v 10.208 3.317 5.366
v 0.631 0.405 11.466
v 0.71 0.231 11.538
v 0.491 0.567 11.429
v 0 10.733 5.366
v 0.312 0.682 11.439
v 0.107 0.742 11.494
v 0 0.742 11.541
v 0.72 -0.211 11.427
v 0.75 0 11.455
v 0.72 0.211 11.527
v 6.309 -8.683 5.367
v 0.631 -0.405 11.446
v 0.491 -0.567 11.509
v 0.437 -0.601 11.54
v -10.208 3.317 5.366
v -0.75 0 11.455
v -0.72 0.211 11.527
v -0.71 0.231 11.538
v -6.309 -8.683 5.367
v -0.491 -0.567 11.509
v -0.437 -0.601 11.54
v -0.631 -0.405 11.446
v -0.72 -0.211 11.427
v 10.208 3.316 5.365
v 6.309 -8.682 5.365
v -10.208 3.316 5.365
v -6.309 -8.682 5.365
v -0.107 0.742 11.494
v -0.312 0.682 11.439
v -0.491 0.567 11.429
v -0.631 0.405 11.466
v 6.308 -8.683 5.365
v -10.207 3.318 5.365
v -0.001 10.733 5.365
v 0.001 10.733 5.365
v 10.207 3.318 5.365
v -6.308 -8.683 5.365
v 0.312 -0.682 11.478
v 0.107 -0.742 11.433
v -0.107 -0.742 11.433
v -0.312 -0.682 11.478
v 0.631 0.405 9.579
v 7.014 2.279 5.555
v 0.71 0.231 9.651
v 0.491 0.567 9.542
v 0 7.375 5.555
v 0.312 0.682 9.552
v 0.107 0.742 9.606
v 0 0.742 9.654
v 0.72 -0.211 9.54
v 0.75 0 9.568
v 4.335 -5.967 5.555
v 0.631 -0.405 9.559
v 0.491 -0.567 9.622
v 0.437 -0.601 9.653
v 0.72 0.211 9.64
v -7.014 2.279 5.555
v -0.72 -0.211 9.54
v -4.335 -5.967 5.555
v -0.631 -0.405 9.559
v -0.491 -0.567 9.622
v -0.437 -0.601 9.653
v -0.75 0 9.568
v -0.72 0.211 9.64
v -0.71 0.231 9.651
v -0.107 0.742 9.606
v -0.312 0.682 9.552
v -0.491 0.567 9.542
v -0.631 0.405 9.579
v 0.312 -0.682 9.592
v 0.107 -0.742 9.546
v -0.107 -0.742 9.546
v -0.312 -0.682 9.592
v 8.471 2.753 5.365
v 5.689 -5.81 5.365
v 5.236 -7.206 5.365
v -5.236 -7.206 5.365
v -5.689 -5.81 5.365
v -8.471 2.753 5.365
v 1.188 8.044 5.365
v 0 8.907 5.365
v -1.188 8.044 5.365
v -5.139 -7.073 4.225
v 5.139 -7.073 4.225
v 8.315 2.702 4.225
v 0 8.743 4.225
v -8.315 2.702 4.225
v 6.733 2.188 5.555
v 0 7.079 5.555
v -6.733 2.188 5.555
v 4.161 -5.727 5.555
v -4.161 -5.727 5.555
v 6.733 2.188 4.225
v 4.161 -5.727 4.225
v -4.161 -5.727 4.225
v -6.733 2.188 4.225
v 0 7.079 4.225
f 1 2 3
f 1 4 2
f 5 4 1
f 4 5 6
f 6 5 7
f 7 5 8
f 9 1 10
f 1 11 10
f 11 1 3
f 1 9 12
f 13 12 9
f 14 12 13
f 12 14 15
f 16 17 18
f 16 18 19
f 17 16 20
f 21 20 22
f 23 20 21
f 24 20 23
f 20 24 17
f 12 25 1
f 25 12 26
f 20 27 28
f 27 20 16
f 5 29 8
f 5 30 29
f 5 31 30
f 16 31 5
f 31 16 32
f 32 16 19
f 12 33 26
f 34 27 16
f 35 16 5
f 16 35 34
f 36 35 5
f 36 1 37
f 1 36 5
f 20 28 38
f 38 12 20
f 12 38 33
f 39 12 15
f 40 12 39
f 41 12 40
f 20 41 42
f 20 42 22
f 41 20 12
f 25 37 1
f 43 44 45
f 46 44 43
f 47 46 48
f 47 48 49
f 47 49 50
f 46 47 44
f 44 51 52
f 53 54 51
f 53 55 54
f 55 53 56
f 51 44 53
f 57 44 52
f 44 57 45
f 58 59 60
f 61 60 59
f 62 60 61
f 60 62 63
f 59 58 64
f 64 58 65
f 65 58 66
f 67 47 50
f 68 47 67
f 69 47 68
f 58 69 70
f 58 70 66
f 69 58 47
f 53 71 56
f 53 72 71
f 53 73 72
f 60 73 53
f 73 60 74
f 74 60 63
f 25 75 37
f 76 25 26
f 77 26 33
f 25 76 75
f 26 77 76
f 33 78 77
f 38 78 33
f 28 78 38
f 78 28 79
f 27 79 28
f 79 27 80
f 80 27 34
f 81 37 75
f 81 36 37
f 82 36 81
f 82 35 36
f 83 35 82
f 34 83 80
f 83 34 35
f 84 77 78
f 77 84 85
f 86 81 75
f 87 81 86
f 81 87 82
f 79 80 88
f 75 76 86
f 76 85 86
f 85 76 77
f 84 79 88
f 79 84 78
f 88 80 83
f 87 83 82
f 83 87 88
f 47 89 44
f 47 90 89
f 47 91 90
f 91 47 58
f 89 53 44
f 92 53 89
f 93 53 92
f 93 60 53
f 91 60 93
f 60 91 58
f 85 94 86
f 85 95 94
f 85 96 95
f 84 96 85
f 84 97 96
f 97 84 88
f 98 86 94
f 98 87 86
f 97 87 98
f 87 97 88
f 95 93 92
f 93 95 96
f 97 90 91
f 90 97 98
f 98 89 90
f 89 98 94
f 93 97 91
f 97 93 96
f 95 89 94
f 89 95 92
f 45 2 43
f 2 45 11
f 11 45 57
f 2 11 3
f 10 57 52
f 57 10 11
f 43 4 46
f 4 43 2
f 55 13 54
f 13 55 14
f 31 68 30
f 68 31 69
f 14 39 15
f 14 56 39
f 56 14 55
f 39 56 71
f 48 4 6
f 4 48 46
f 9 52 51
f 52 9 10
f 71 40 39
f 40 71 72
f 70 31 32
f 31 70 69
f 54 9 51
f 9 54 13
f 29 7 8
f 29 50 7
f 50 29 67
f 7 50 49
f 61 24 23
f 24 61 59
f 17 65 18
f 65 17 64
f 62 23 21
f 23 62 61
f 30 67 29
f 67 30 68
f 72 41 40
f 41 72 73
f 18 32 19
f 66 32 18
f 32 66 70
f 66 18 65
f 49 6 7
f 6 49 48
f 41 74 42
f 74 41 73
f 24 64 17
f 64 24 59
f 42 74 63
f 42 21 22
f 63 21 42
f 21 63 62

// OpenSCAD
angle = 31.72;
externalRadius = 12;
internalRdius = 10.113; // Pour épaisseur paroi 1.5 mm
diametreTrouBouchon = 1.5;
echelleReductionAjustementBouchon = 0.95;
r = 0.19; // résolution d'impression sur l'axe Z


//corps_ouvert();
bouchon_trou(1);

module corps_ouvert() {
    rotate([180, 0, 0])
	difference() {
		ico_creux();
		decoupe_bouchon();
	}
}

module bouchon_trou(version) {
	//scale([echelleReductionAjustementBouchon, echelleReductionAjustementBouchon, 1])
	difference () {
        union() {
            intersection() {
                ico_creux();
                decoupe_bouchon(echelleReductionAjustementBouchon);
            }
            // Partie de feuillure manquante
            difference() {
               rotate([0,0,18]) translate([0,0,externalRadius/2.718-r])
                cylinder(7*r, internalRdius*0.91*echelleReductionAjustementBouchon, internalRdius*0.93*echelleReductionAjustementBouchon, $fn=5);
               rotate([0,0,18]) translate([0,0,externalRadius/2.718-2*r])
                cylinder(8*r, r=internalRdius*0.7, $fn=5);
            }
        }
        if (version == 1) {
            translate([0, 0, externalRadius/2.718])
            cylinder(30, r=diametreTrouBouchon/2, $fn=22);
        } else {
            translate([0, 0, externalRadius*0.82])
            rotate([90, 0, 0])
            cylinder(60, r=diametreTrouBouchon/2, $fn=22, center=true);
        }
	}
}

module ico_creux() {
	difference() {
        rotate([-angle, 0, 0]) icosahedron(externalRadius);
        rotate([-angle, 0, 0]) icosahedron(internalRdius);
	}
}

module decoupe_bouchon(scale=1) {
	rotate([0,0,18]) translate([0,0,externalRadius/2.718+5*r])
		cylinder(60*r, r=externalRadius*0.9, $fn=5);
	rotate([0,0,18]) translate([0,0,externalRadius/2.718-r])
		cylinder(7*r, internalRdius*0.91*scale, internalRdius*0.93*scale, $fn=5);
}

module icosahedron(rad=1) {
	Cphi = (1+sqrt(5))/2;

	// Convert spherical to cartesian
	function sph_to_cart(c, rad) = [
		rad*sin(atan2(sqrt(c[0]*c[0]+c[1]*c[1]), c[2]))*cos(atan2(c[1],c[0])),  
		rad*sin(atan2(sqrt(c[0]*c[0]+c[1]*c[1]), c[2]))*sin(atan2(c[1],c[0])),
		rad*cos(atan2(sqrt(c[0]*c[0]+c[1]*c[1]), c[2]))
		];


	//================================================
	//	Icosahedron
	//================================================
	//
	// (0, +-1, +-Cphi)
	// (+-Cphi, 0, +-1)
	// (+-1, +-Cphi, 0)

	function icosa_unit(rad) = [
		sph_to_cart([0, +1, +Cphi], rad), 
		sph_to_cart([0, +1, -Cphi], rad),
		sph_to_cart([0, -1, -Cphi], rad),
		sph_to_cart([0, -1, +Cphi], rad),
		sph_to_cart([+Cphi, 0, +1], rad), 
		sph_to_cart([+Cphi, 0, -1], rad), 
		sph_to_cart([-Cphi, 0, -1], rad),
		sph_to_cart([-Cphi, 0, +1], rad),
		sph_to_cart([+1, +Cphi, 0], rad),
		sph_to_cart([+1, -Cphi, 0], rad), 
		sph_to_cart([-1, -Cphi, 0], rad), 
		sph_to_cart([-1, +Cphi, 0], rad),
		];

	icosa_faces = [ 
		[3,0,4],
		[3,4,9],
		[3,9,10],
		[3,10,7],
		[3,7,0],
		[0,8,4],
		[0,7,11],
		[0,11,8],
		[4,8,5],
		[4,5,9],
		[7,10,6],
		[7,6,11],
		[9,5,2],
		[9,2,10],
		[2,6,10],
		[1,5,8],
		[1,8,11],
		[1,11,6],
		[5,1,2],
		[2,1,6]
		];

	polyhedron(icosa_unit(rad), faces = icosa_faces);
}
